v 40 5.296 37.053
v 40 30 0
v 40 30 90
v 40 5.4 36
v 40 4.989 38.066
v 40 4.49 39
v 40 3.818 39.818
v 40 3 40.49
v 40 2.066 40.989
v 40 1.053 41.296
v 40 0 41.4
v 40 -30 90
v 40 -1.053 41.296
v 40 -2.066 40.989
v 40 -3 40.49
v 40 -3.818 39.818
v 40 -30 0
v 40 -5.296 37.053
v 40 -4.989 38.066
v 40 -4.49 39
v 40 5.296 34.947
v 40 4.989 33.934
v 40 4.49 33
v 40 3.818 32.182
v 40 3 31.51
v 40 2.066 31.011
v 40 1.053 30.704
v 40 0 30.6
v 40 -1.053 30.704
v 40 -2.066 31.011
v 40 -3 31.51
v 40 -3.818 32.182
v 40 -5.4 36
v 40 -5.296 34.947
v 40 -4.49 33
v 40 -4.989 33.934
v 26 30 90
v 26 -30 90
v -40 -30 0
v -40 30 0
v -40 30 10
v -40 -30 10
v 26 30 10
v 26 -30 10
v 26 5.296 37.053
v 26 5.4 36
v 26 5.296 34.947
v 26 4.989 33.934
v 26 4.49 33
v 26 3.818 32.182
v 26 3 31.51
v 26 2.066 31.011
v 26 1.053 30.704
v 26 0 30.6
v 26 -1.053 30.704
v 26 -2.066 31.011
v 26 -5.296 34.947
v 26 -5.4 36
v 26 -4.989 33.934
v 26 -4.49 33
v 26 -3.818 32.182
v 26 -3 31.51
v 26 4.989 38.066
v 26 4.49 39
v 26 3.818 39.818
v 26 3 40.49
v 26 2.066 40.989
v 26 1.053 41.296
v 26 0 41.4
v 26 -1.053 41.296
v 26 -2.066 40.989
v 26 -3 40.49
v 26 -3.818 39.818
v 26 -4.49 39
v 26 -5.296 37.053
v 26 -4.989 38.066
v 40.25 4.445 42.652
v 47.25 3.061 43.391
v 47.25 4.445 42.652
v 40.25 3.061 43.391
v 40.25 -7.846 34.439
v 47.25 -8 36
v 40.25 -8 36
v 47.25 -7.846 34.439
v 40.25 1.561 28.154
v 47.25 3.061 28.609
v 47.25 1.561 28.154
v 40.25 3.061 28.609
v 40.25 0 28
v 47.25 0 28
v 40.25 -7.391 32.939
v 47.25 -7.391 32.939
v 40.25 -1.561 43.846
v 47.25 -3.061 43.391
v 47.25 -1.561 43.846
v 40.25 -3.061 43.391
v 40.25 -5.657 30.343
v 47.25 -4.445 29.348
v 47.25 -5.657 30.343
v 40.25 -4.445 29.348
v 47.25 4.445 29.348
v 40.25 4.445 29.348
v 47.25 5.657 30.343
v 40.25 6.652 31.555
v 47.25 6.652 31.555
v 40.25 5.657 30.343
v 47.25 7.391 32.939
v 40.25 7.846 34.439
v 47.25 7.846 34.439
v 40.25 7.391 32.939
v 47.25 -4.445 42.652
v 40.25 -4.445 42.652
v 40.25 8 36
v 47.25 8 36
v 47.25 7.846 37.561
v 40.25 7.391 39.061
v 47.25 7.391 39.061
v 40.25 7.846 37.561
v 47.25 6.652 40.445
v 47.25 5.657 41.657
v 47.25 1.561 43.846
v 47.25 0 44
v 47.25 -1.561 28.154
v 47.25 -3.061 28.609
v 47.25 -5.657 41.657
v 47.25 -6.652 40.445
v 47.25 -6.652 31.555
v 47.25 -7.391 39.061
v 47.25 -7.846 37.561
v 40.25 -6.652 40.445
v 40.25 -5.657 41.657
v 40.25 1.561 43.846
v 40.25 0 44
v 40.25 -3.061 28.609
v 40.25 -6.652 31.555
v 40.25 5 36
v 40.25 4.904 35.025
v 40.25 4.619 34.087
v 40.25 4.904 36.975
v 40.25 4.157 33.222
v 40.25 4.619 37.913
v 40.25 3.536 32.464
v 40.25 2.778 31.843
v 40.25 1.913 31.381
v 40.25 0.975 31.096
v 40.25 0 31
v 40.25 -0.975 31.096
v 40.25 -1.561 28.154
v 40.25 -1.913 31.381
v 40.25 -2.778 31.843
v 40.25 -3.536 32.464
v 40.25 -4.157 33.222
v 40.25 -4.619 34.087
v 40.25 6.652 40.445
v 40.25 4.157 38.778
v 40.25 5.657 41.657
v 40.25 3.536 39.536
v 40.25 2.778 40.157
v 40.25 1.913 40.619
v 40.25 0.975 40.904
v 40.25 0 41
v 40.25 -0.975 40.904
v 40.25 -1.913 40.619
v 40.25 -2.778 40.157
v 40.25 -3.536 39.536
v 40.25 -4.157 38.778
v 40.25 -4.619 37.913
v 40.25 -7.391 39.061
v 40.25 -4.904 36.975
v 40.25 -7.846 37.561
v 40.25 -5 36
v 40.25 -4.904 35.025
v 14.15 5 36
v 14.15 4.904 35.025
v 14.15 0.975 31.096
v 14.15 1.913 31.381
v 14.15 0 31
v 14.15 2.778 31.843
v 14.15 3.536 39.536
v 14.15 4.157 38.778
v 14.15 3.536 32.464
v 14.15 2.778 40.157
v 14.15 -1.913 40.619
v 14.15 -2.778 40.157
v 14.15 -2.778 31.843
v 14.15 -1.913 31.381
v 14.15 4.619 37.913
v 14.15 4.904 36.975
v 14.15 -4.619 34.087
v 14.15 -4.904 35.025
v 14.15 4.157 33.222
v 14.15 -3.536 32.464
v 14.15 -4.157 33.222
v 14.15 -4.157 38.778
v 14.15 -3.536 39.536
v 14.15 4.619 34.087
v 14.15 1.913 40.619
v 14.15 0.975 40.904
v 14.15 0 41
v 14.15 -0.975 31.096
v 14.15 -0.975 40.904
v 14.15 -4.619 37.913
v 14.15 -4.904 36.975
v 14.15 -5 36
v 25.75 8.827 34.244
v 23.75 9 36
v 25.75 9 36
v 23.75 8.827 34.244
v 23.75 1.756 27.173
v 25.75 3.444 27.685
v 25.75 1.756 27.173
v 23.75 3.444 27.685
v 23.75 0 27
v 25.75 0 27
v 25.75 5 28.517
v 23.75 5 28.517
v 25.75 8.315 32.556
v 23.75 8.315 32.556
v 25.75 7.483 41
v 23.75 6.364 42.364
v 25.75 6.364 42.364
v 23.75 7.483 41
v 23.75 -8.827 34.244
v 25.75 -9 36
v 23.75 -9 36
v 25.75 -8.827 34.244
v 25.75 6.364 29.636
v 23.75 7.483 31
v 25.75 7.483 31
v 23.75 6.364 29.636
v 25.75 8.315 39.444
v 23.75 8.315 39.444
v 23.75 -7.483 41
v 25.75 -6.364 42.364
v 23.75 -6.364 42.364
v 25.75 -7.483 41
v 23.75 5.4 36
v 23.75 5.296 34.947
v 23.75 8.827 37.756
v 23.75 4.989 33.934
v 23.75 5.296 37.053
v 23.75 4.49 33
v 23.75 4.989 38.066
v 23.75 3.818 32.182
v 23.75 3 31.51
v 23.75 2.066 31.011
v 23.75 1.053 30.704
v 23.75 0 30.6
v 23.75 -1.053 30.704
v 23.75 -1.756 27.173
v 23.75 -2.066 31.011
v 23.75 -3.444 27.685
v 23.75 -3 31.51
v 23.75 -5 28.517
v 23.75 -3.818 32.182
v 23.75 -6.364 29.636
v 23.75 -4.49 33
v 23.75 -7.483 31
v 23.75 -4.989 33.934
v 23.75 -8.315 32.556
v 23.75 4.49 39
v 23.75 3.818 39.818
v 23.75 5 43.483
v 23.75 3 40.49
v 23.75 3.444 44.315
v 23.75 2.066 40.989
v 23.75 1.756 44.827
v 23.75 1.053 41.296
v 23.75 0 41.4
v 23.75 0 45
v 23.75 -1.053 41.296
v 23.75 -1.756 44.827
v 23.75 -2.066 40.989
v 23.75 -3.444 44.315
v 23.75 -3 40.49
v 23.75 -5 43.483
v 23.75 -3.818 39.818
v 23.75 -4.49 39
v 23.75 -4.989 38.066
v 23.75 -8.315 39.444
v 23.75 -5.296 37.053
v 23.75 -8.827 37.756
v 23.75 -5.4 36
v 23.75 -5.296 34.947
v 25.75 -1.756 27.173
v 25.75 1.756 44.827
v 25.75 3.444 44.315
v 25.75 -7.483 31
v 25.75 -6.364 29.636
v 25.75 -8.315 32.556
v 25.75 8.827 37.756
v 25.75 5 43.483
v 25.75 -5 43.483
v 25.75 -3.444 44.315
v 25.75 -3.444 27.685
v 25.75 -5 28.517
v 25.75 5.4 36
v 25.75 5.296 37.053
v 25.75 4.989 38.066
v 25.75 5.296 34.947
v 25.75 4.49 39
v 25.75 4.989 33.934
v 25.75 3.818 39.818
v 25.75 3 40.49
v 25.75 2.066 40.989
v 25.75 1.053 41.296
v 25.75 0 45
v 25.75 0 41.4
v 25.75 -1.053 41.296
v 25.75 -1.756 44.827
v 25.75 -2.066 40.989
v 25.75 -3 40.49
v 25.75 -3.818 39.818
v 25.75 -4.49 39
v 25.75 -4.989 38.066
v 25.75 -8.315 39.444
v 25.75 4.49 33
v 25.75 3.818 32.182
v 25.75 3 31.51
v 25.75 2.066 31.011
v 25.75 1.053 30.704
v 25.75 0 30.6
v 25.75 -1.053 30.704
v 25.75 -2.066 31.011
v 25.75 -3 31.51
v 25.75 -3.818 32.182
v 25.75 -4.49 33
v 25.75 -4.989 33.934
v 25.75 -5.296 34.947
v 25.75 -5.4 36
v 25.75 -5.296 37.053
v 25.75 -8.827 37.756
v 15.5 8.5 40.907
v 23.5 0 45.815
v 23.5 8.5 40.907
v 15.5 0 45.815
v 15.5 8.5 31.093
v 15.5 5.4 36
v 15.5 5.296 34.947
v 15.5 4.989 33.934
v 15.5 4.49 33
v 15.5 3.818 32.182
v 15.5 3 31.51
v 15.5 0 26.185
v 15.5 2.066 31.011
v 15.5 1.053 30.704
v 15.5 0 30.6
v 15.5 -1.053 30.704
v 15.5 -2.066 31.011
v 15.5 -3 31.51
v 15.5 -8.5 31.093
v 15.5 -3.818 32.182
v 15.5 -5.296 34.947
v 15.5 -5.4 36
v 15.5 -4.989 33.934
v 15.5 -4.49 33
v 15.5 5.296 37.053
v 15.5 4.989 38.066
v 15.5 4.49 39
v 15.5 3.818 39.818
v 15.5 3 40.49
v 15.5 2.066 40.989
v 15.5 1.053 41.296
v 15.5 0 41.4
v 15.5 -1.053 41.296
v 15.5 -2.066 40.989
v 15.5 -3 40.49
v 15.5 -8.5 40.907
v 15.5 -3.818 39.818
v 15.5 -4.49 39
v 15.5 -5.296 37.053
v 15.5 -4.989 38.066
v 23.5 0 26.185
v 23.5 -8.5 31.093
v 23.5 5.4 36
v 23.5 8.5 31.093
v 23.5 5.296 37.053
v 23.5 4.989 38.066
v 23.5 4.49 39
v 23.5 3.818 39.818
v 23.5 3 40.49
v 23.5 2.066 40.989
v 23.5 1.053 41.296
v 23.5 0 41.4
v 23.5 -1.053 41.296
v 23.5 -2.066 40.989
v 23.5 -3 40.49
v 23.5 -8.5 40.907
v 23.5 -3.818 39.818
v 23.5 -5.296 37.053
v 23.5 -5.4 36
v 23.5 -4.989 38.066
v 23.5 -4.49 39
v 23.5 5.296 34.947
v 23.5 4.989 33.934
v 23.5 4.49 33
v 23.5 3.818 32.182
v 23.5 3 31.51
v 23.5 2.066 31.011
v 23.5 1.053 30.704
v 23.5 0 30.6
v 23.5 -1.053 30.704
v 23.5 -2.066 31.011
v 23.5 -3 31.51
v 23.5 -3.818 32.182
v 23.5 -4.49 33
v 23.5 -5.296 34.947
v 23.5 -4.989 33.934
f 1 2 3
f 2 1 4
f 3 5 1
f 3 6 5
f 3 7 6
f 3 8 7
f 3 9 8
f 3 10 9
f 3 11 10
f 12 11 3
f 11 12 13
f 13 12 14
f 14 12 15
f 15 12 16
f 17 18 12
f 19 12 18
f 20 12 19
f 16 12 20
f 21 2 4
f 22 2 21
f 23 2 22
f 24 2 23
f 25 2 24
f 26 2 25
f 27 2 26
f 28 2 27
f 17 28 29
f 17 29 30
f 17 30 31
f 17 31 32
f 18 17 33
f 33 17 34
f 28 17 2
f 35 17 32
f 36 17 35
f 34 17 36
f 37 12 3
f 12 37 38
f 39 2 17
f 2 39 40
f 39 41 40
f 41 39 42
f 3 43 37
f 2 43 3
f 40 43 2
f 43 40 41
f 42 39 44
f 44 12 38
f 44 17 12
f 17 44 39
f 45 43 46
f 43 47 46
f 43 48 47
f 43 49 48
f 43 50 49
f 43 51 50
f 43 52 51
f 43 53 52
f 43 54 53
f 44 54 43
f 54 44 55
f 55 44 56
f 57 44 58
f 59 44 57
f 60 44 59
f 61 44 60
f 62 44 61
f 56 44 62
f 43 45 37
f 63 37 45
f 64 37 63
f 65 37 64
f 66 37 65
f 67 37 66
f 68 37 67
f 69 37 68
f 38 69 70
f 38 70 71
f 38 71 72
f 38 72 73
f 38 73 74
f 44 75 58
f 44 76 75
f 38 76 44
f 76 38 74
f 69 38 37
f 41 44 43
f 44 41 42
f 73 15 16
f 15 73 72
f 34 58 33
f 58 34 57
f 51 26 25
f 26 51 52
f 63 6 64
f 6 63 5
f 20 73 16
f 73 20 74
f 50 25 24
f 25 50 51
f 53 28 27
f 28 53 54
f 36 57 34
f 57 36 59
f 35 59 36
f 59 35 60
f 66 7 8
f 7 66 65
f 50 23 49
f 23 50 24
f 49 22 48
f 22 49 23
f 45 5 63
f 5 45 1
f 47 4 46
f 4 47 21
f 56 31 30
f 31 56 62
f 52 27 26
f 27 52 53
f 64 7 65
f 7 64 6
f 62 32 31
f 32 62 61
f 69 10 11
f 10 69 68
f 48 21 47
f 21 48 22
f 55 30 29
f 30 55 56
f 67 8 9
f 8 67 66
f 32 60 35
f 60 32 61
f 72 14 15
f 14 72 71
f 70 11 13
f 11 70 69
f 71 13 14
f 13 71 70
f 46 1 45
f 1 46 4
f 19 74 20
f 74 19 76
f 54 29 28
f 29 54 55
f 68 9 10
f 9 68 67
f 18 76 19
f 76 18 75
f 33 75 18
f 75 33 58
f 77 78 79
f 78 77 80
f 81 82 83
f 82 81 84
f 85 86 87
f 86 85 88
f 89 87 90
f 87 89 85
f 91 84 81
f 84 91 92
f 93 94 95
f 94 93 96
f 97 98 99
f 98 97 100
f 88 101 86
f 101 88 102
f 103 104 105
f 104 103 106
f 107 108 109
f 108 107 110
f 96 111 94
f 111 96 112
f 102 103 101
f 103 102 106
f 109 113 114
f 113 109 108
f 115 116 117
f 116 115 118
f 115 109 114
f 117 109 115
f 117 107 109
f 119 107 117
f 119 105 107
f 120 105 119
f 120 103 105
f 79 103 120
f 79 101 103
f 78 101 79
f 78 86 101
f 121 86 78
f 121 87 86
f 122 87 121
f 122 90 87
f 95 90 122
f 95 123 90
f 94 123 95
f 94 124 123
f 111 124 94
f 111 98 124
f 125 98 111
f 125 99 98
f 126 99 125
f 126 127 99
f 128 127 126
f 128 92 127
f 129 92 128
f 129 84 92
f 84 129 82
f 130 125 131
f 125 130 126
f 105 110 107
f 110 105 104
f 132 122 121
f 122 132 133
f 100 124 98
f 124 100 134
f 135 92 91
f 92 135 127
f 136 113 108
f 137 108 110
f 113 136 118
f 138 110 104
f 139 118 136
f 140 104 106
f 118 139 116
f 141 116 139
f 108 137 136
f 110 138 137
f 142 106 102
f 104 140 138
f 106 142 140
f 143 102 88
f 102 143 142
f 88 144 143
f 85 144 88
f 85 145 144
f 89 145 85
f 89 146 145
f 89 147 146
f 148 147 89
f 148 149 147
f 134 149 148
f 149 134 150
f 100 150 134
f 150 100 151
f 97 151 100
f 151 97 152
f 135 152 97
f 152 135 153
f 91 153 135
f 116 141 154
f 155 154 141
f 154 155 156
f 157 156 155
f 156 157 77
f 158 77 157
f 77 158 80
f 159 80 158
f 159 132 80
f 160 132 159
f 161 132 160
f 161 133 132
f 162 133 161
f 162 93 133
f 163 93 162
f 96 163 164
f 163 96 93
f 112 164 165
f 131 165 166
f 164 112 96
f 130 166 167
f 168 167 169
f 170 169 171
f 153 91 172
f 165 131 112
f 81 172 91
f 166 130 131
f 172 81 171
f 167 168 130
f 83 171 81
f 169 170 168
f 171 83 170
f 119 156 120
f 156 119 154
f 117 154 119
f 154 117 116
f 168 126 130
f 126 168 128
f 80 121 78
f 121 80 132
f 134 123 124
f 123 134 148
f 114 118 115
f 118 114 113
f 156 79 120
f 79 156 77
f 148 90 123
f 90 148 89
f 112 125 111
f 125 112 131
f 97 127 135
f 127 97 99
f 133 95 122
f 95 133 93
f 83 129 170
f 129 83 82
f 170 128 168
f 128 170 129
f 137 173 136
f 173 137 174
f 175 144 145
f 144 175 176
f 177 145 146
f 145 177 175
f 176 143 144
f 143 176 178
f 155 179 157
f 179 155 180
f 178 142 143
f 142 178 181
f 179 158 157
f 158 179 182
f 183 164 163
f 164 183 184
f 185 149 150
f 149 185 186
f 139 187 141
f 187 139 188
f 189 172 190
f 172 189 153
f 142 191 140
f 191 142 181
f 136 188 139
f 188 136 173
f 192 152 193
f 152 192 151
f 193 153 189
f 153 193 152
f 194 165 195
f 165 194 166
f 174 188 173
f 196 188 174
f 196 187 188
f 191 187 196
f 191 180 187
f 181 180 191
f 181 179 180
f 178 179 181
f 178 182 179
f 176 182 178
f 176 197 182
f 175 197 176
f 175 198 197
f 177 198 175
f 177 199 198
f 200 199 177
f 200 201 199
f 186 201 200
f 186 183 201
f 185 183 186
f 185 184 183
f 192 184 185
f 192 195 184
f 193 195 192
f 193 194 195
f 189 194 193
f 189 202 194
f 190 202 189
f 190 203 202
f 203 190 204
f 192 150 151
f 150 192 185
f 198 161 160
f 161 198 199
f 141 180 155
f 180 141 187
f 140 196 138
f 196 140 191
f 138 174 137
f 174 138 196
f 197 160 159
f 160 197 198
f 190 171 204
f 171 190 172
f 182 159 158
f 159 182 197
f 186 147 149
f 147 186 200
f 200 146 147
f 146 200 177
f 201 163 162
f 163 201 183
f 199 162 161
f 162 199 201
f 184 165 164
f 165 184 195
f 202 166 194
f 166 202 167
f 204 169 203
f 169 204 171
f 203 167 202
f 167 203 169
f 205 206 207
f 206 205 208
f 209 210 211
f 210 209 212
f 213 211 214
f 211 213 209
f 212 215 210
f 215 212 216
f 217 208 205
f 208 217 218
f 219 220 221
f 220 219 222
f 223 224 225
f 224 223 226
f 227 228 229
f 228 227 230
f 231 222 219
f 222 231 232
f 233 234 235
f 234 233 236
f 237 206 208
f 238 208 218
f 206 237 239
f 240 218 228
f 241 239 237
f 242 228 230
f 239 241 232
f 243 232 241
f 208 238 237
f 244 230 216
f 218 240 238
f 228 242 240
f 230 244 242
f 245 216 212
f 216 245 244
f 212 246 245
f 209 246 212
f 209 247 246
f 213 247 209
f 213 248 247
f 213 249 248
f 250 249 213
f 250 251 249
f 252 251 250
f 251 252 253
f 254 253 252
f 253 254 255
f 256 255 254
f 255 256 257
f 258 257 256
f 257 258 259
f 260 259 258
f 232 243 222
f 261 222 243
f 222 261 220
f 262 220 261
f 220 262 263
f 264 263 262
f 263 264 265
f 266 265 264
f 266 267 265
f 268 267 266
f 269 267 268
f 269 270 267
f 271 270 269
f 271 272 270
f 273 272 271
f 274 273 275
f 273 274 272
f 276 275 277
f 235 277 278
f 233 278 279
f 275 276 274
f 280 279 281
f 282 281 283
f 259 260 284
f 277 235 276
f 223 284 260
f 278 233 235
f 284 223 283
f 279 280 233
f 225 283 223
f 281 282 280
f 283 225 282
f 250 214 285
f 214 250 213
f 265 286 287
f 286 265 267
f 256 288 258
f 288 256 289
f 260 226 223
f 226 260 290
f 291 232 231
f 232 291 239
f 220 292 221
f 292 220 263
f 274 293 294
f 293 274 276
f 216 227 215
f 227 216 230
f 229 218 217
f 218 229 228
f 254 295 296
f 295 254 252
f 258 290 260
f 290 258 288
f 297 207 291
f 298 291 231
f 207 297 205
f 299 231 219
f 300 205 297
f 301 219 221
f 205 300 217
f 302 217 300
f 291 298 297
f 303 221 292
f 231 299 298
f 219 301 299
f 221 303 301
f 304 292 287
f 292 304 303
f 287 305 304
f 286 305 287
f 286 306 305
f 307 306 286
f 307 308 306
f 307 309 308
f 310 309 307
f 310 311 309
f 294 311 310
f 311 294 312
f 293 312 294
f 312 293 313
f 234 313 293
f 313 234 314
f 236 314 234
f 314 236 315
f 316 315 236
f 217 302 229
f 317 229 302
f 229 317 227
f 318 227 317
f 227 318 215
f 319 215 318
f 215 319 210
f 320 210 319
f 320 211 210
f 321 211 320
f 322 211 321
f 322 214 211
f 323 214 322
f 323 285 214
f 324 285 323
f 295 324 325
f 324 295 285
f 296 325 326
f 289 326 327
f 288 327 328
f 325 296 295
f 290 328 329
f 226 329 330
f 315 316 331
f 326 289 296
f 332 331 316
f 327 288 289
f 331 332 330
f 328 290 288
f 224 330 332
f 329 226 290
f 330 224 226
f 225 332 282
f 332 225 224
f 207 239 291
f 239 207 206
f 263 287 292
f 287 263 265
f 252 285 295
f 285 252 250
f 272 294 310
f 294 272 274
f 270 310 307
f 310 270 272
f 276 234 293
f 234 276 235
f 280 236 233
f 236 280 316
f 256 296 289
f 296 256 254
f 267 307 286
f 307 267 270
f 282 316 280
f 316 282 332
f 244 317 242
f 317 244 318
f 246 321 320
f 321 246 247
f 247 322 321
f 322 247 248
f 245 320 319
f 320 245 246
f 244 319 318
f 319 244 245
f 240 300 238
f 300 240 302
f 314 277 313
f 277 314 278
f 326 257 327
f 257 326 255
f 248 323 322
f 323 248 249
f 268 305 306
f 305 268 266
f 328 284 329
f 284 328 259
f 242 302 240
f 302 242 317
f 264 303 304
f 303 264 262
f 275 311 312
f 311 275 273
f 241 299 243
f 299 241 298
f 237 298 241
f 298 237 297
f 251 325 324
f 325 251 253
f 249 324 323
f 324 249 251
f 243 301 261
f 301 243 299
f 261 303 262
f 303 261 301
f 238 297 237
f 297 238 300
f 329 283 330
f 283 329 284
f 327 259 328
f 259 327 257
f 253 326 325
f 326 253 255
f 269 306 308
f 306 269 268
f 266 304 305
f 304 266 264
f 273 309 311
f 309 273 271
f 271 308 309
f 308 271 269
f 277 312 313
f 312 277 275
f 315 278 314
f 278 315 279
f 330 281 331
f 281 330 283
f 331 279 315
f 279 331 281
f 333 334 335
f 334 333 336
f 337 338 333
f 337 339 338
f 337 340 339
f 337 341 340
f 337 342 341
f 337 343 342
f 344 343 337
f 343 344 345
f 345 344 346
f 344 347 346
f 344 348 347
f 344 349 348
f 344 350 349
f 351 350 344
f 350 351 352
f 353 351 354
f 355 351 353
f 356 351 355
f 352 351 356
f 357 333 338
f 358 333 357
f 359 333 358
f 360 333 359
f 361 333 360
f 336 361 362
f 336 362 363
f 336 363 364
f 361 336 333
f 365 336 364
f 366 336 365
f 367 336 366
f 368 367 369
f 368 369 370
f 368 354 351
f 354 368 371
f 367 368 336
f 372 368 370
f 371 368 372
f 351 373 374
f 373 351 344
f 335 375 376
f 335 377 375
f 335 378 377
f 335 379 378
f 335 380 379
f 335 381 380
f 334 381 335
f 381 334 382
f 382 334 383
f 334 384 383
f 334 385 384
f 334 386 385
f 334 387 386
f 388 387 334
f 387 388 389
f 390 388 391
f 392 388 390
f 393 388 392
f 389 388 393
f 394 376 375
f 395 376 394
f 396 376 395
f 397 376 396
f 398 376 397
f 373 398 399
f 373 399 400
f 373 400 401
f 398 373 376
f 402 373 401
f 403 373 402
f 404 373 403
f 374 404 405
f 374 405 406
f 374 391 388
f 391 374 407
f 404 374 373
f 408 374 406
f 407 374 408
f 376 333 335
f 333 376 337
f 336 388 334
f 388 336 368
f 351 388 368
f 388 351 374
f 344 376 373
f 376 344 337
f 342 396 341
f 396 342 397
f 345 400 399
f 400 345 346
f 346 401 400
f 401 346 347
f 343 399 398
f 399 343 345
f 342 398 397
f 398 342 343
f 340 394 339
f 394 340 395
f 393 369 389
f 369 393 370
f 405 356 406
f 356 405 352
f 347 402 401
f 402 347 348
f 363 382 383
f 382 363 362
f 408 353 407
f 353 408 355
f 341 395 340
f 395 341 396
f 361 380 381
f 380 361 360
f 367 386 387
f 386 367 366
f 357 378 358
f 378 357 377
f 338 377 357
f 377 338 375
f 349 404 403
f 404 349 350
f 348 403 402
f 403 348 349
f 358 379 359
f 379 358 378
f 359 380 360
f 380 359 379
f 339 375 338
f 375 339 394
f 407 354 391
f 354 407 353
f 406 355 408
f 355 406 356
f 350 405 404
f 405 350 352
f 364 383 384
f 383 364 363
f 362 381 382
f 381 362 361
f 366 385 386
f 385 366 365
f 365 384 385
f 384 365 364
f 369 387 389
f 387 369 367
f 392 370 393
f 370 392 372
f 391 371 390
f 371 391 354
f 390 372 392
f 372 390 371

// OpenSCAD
$fn = 32;

// ------------------------------------------------------------------------
// Bolted bracket: 80 x 60 mm bracket with 1 bolt joints
// Every part is its own module, assembly() places them once.
// ------------------------------------------------------------------------

// --- part 1 ---
module bracket() {
  difference() {
    translate([-40, -30, 0]) cube([80, 60, 90]);
    translate([-41, -31, 10]) cube([67, 62, 81]);
    translate([33, 0, 36]) rotate([0, 90, 0]) cylinder(h = 16, d = 10.8, center = true);
  }
}

// --- part 2 ---
module bolt() {
  cylinder(h = 7, d = 16);
  translate([0, 0, -26.1]) cylinder(h = 26.1, d = 10);
}

// --- part 3 ---
module washer() {
  difference() {
      translate([0, 0, 0]) cylinder(h = 2, d = 18);
      translate([0, 0, -1]) cylinder(h = 4, d = 10.8);
    }
}

// --- part 4 ---
module nut() {
  difference() {
    linear_extrude(height = 8) polygon(points = [[9.815, 0], [4.907, 8.5], [-4.907, 8.5], [-9.815, 0], [-4.907, -8.5], [4.907, -8.5]]);
    translate([0, 0, -1]) cylinder(h = 10, d = 10.8);
  }
}

// --- assembly ---
module assembly() {
  translate([0, 0, 0]) rotate([0, 0, 0]) bracket();
  translate([40.25, 0, 36]) rotate([0, 90, 0]) bolt();
  translate([23.75, 0, 36]) rotate([0, 90, 0]) washer();
  translate([15.5, 0, 36]) rotate([0, 90, 0]) nut();
}

assembly();
